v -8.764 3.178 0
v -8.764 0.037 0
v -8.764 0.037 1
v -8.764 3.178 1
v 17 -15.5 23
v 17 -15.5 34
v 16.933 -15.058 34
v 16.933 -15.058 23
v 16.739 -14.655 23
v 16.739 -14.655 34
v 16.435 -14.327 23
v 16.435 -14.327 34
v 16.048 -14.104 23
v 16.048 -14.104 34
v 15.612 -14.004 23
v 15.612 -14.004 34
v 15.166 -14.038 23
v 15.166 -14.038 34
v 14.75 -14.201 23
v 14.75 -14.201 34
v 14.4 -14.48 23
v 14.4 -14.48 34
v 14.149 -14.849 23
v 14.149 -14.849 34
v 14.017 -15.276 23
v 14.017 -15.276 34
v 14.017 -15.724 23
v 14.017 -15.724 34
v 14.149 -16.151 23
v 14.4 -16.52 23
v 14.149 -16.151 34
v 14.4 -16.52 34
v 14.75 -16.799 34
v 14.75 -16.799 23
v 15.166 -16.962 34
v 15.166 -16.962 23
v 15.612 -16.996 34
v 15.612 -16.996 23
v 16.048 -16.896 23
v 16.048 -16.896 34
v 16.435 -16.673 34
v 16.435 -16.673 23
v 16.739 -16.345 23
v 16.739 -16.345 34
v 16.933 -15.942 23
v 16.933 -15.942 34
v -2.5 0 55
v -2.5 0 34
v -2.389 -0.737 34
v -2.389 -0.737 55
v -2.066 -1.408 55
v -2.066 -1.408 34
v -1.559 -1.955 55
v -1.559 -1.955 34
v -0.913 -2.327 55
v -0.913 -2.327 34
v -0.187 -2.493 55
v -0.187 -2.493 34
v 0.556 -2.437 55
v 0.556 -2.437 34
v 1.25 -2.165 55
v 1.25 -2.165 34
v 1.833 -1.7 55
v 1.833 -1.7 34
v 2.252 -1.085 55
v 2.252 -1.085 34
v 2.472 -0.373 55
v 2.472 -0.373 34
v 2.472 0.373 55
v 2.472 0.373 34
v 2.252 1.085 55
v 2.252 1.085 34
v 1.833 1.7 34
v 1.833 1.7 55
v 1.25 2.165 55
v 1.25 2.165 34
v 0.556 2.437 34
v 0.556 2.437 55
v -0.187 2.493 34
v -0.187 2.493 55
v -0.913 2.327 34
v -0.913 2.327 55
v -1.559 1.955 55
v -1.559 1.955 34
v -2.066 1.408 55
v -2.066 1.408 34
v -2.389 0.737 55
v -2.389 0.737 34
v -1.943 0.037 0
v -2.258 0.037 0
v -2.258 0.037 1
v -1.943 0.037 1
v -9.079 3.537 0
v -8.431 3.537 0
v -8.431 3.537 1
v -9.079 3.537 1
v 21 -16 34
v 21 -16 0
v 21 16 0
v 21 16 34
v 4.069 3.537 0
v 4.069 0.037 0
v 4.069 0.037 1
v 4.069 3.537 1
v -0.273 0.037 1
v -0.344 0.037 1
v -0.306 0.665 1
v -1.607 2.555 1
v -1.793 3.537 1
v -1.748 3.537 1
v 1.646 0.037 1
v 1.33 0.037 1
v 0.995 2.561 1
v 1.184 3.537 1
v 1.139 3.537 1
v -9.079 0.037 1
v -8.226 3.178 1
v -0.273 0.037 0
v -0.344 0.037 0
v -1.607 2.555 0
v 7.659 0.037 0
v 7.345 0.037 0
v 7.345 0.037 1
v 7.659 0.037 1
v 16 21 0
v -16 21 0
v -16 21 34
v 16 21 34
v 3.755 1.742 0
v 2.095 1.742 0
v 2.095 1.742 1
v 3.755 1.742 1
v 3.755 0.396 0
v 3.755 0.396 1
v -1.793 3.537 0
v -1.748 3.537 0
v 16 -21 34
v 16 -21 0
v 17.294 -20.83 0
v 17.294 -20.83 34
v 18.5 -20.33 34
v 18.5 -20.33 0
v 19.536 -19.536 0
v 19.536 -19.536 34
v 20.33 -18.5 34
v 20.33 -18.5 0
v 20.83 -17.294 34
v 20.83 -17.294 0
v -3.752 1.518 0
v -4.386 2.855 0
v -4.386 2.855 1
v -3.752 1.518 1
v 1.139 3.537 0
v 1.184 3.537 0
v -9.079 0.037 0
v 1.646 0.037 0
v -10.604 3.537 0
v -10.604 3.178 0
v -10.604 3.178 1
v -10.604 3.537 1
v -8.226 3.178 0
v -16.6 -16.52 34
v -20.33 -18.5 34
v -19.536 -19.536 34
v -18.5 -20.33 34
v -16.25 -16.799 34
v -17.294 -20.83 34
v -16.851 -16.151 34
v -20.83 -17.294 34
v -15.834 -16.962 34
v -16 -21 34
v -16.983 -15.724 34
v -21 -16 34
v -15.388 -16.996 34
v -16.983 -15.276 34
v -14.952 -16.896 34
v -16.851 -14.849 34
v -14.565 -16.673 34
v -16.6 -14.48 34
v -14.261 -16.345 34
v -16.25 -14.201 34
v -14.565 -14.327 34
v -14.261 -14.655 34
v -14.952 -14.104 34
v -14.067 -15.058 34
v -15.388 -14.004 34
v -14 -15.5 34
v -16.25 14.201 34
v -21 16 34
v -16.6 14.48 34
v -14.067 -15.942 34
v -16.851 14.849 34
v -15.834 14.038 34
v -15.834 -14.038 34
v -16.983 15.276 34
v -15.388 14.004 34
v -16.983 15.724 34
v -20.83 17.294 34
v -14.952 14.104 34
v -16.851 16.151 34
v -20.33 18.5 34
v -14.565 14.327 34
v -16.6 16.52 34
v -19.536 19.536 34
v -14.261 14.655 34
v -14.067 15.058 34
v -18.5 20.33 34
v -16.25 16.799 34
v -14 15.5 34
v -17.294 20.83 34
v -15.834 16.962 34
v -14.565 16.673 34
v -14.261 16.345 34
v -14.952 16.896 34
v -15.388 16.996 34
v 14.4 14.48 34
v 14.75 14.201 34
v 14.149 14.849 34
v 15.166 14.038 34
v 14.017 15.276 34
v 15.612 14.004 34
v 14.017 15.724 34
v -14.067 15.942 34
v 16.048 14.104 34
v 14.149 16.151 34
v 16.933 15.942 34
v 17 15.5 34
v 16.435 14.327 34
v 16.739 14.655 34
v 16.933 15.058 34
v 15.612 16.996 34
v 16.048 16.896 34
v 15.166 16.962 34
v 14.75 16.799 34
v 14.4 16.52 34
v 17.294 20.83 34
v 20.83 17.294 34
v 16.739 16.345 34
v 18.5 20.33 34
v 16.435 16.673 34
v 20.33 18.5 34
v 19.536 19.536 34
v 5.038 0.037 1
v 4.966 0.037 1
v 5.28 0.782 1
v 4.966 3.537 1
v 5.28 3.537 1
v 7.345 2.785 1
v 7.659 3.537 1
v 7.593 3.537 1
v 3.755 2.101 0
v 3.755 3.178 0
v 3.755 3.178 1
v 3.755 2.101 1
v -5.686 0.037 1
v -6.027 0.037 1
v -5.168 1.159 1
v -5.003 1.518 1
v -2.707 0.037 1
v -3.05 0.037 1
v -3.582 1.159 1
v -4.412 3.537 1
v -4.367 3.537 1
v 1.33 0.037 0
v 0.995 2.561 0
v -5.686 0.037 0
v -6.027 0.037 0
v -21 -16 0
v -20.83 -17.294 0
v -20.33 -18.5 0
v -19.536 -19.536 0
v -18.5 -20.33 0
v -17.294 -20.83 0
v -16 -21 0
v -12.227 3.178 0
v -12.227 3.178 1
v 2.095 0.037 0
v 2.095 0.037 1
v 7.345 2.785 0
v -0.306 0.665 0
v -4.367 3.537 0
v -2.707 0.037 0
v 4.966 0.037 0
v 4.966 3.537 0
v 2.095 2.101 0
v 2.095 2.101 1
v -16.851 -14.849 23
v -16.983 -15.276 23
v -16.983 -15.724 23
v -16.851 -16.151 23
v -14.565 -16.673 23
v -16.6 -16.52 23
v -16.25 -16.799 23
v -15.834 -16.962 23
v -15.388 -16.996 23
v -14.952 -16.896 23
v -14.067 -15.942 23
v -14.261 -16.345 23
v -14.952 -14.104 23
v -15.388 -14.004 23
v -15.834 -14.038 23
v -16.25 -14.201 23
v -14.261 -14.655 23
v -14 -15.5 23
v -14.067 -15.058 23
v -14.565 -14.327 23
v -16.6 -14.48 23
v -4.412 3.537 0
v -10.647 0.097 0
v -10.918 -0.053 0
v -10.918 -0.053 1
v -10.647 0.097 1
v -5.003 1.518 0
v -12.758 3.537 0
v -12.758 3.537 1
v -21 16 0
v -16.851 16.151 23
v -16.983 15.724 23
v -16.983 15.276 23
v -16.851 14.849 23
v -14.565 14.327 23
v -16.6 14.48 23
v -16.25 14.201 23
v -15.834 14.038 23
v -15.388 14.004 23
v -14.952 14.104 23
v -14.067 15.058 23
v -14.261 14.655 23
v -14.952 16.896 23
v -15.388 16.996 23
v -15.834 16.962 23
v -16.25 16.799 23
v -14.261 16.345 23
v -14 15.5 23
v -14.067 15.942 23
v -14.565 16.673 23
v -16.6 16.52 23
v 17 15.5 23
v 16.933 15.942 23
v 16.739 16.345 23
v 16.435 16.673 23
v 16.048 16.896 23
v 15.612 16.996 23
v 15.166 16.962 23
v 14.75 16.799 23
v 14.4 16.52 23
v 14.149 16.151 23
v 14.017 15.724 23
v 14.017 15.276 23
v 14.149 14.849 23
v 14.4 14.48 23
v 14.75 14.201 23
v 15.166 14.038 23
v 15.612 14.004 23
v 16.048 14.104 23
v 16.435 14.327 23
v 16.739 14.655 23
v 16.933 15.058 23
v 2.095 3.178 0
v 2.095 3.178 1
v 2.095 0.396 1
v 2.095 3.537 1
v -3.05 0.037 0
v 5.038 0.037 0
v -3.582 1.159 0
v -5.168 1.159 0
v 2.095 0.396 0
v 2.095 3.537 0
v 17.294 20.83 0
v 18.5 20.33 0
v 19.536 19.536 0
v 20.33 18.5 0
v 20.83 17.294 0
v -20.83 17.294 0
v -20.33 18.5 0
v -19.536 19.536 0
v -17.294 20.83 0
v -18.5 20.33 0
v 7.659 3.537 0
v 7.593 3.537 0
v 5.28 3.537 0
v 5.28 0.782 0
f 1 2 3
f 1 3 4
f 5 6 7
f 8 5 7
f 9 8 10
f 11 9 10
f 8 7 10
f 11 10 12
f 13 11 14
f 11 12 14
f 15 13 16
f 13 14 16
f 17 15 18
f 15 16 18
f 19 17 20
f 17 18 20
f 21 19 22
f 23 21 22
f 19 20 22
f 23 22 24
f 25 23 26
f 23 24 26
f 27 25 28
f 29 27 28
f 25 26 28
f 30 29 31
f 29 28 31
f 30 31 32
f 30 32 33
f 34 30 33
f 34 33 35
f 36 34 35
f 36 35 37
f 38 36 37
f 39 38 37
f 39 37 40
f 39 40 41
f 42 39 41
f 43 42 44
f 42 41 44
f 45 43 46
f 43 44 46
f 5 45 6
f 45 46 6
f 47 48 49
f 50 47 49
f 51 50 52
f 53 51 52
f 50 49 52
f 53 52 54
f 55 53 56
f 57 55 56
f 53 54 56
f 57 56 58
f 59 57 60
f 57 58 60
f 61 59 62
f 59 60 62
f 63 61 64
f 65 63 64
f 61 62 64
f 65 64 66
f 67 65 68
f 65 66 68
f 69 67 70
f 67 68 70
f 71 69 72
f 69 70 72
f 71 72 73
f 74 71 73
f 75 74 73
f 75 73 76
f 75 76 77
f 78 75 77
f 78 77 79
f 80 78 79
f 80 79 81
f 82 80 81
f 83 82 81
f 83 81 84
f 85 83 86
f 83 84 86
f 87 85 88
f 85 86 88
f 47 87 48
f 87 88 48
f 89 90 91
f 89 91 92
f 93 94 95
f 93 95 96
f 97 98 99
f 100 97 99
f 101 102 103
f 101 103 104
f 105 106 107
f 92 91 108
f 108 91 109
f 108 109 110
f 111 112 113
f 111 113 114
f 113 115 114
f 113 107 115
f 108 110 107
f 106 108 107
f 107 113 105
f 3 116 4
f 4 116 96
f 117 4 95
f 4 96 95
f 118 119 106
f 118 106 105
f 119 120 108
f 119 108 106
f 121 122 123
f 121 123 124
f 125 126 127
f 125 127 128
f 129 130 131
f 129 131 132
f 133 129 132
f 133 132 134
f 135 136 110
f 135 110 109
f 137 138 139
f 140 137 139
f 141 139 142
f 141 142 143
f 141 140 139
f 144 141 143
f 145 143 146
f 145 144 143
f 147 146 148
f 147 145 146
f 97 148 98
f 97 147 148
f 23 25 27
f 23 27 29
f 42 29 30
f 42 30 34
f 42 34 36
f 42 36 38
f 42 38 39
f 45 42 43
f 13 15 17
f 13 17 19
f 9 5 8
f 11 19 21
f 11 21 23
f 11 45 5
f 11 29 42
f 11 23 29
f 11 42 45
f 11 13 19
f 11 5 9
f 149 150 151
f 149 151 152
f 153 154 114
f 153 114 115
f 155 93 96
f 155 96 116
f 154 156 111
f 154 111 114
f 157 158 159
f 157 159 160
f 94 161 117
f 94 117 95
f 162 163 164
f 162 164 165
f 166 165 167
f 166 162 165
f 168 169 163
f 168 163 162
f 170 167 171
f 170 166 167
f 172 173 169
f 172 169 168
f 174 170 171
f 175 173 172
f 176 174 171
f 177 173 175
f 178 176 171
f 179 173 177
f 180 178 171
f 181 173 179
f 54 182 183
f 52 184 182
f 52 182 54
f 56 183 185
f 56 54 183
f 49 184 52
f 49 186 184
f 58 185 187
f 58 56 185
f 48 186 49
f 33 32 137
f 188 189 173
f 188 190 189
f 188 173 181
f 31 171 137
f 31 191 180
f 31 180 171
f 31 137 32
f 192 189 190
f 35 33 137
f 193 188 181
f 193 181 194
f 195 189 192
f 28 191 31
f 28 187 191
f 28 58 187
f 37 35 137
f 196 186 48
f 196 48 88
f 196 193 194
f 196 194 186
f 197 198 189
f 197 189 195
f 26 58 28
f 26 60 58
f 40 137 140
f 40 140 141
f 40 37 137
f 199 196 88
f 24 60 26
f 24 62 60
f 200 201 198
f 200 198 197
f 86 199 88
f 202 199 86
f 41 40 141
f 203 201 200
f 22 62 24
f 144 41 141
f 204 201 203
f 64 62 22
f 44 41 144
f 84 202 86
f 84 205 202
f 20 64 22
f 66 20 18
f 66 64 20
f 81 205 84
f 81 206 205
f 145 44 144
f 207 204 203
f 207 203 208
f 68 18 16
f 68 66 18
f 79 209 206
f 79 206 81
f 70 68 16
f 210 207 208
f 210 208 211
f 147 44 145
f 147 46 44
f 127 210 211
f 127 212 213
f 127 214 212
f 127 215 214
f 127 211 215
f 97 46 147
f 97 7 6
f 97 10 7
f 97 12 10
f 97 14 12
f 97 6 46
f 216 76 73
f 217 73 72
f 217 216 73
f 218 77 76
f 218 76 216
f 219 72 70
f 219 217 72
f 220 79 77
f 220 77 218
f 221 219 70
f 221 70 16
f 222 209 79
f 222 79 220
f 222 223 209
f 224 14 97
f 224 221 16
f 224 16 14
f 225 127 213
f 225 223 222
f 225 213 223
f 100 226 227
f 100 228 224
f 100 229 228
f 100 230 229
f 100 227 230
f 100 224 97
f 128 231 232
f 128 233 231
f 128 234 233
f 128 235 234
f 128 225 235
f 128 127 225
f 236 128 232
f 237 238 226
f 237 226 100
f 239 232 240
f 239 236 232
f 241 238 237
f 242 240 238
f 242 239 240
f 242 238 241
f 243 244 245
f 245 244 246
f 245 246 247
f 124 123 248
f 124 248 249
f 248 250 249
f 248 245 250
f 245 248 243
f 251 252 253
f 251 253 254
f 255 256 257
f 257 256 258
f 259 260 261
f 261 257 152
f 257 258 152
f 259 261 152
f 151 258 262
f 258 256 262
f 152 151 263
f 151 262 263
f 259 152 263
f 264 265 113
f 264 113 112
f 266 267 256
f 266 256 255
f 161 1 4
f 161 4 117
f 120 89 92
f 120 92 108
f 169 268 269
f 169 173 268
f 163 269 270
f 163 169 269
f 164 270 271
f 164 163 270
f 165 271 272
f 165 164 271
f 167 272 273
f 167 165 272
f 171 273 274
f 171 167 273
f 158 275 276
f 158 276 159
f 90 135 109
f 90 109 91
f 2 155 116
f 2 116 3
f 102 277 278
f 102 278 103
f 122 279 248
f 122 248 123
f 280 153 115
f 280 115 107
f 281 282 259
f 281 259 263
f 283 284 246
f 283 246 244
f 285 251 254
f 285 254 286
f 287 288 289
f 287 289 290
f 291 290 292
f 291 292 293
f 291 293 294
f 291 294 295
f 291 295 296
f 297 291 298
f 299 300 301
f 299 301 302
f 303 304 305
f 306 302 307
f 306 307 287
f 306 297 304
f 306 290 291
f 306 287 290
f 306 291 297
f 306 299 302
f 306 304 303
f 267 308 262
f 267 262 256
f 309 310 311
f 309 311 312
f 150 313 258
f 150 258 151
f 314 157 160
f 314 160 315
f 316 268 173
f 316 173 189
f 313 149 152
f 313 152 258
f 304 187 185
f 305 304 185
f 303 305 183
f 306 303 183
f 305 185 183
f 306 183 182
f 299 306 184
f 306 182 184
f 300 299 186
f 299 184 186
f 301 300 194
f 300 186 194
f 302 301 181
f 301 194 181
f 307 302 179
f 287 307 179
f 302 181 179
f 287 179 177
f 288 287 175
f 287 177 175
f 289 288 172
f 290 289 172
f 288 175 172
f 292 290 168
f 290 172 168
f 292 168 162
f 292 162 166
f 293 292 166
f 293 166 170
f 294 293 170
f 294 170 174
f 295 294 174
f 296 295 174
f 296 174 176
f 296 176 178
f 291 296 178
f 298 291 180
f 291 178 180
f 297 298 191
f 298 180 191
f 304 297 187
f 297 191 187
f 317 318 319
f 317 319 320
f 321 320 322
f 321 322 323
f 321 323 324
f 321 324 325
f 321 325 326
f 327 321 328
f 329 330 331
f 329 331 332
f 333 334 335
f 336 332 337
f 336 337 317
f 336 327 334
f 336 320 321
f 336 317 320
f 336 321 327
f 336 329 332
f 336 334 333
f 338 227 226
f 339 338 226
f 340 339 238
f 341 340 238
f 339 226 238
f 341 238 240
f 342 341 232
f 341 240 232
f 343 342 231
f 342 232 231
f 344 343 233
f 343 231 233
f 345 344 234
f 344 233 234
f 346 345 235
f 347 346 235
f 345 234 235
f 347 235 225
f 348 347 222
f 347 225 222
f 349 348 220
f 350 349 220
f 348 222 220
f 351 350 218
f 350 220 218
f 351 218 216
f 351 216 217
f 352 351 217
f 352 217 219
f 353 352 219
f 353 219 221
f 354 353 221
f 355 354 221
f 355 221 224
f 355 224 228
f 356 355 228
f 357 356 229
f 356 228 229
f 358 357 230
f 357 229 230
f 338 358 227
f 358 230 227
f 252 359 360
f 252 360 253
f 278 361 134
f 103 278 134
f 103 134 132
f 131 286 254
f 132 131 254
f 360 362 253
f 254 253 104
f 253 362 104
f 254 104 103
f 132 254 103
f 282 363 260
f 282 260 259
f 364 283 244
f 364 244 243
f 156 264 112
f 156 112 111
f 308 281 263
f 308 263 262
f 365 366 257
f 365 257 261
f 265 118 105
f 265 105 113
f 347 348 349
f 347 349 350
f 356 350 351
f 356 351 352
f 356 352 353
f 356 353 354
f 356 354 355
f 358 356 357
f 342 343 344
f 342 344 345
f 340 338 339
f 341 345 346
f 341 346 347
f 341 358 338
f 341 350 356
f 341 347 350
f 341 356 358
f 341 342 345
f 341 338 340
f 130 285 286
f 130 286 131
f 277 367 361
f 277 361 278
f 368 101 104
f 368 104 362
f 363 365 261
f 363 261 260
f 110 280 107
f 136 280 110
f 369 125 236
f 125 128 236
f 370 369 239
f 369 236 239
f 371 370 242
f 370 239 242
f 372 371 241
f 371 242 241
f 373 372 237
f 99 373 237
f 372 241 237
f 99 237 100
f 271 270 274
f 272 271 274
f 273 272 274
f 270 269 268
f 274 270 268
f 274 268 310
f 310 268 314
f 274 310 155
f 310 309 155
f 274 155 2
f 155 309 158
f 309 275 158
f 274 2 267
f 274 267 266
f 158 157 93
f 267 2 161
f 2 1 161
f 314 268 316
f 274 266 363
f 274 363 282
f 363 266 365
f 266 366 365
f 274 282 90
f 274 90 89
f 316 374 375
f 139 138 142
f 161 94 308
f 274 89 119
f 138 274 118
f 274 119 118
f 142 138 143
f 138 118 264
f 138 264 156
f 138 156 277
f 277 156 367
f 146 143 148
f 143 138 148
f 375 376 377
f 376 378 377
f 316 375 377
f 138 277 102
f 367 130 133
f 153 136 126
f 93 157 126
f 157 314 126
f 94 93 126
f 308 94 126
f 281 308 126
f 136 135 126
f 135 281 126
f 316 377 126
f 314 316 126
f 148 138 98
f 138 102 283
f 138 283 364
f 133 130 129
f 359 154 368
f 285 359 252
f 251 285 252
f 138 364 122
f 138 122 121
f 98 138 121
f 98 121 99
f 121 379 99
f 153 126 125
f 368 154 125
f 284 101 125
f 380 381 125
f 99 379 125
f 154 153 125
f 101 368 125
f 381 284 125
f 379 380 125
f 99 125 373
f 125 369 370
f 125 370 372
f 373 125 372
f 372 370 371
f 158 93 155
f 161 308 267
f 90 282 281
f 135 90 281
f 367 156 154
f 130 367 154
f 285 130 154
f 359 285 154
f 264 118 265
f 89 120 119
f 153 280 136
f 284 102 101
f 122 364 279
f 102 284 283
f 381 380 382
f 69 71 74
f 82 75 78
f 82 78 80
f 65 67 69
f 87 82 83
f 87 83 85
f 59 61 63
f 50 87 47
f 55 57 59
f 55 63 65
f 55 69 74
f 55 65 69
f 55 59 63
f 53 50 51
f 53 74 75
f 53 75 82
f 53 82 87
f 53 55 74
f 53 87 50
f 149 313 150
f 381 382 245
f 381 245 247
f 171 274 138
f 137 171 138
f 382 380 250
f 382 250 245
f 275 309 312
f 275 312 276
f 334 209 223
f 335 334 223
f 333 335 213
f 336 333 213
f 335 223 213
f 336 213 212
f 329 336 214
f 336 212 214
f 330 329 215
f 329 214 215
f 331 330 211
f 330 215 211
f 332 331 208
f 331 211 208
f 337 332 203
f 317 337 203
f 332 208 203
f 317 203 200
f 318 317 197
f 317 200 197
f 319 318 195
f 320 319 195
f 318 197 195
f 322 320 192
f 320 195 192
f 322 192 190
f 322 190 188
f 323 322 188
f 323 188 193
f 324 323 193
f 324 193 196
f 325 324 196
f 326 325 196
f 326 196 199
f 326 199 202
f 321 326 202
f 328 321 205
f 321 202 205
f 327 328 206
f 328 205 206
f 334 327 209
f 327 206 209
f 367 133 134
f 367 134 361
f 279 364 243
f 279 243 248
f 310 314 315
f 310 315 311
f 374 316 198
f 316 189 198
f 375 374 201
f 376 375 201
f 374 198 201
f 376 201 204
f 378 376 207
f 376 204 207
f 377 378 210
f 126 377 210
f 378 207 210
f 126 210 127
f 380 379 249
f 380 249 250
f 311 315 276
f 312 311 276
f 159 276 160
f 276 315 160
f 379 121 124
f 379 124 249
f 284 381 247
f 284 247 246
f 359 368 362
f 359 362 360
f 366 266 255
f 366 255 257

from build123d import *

# Parameters (mm, degrees)
SZKIC1_W                    = 42
SZKIC1_H                    = 42
DODANIE_WYCI_GNI_CIE1_DEPTH = 34
SZKIC2_R                    = 1.5
WYTNIJ_WYCI_GNI_CIE1_DEPTH  = 11
SZKIC6_R                    = 1.5
WYTNIJ_WYCI_GNI_CIE2_DEPTH  = 11
SZKIC7_R                    = 1.5
WYTNIJ_WYCI_GNI_CIE3_DEPTH  = 11
SZKIC8_R                    = 1.5
WYTNIJ_WYCI_GNI_CIE4_DEPTH  = 11
ZAOKR_GLENIE1_R             = 5
SZKIC9_R                    = 2.5
DODANIE_WYCI_GNI_CIE4_DEPTH = 21
WYTNIJ_WYCI_GNI_CIE5_DEPTH  = 1


with BuildPart() as part:
    # Szkic1 → Dodanie-wyciągnięcie1 (new body)
    with BuildSketch(Plane.XY):
        Rectangle(SZKIC1_W, SZKIC1_H)
    extrude(amount=DODANIE_WYCI_GNI_CIE1_DEPTH)

    # Szkic2 → Wytnij-wyciągnięcie1 (cut)
    with BuildSketch(Plane.XY.offset(34)):
        with Locations((15.5, 15.5)):
            Circle(SZKIC2_R)
    extrude(amount=-WYTNIJ_WYCI_GNI_CIE1_DEPTH, mode=Mode.SUBTRACT)

    # Szkic6 → Wytnij-wyciągnięcie2 (cut)
    with BuildSketch(Plane.XY.offset(34)):
        with Locations((-15.5, 15.5)):
            Circle(SZKIC6_R)
    extrude(amount=-WYTNIJ_WYCI_GNI_CIE2_DEPTH, mode=Mode.SUBTRACT)

    # Szkic7 → Wytnij-wyciągnięcie3 (cut)
    with BuildSketch(Plane.XY.offset(34)):
        with Locations((-15.5, -15.5)):
            Circle(SZKIC7_R)
    extrude(amount=-WYTNIJ_WYCI_GNI_CIE3_DEPTH, mode=Mode.SUBTRACT)

    # Szkic8 → Wytnij-wyciągnięcie4 (cut)
    with BuildSketch(Plane.XY.offset(34)):
        with Locations((15.5, -15.5)):
            Circle(SZKIC8_R)
    extrude(amount=-WYTNIJ_WYCI_GNI_CIE4_DEPTH, mode=Mode.SUBTRACT)

    # Zaokrąglenie1
    zaokr_glenie1_edges = [part.edges().sort_by_distance(p)[0] for p in [
        (21, -21, 17),
        (-21, -21, 17),
        (-21, 21, 17),
        (21, 21, 17),
    ]]
    fillet(zaokr_glenie1_edges, radius=ZAOKR_GLENIE1_R)

    # Szkic9 → Dodanie-wyciągnięcie4 (add)
    with BuildSketch(Plane.XY.offset(34)):
        with Locations(Location((0, 0, 0), (0, 0, 180))):
            Circle(SZKIC9_R)
    extrude(amount=DODANIE_WYCI_GNI_CIE4_DEPTH)

    # Szkic11 → Wytnij-wyciągnięcie5 (cut)
    # profile 1 of 6: a face of its own
    with BuildSketch(Plane(origin=(0, 0, 0), x_dir=(-1, 0, 0), z_dir=(0, 0, -1))):
        Polygon((-7.658605606, 0.036910524), (-7.658605606, 3.536910524), (-7.592700157, 3.536910524), (-5.280400478, 0.782202992), (-5.280400478, 3.536910524), (-4.966297913, 3.536910524), (-4.966297913, 0.036910524), (-5.037812336, 0.036910524), (-7.344503042, 2.78530796), (-7.344503042, 0.036910524), align=None)
    # profile 2 of 6: a face of its own
    with BuildSketch(Plane(origin=(0, 0, 0), x_dir=(-1, 0, 0), z_dir=(0, 0, -1))):
        Polygon((-4.068862016, 3.536910524), (-2.094503042, 3.536910524), (-2.094503042, 3.177936165), (-3.754759452, 3.177936165), (-3.754759452, 2.101013088), (-2.094503042, 2.101013088), (-2.094503042, 1.742038729), (-3.754759452, 1.742038729), (-3.754759452, 0.395884883), (-2.094503042, 0.395884883), (-2.094503042, 0.036910524), (-4.068862016, 0.036910524), align=None)
    # profile 3 of 6: a face of its own
    with BuildSketch(Plane(origin=(0, 0, 0), x_dir=(-1, 0, 0), z_dir=(0, 0, -1))):
        Polygon((-1.645785093, 0.036910524), (-1.18374583, 3.536910524), (-1.138874035, 3.536910524), (0.306137984, 0.665115652), (1.747644394, 3.536910524), (1.793217311, 3.536910524), (2.258061061, 0.036910524), (1.942556253, 0.036910524), (1.607420035, 2.555340011), (0.343998561, 0.036910524), (0.27318526, 0.036910524), (-0.995144067, 2.560948986), (-1.329579163, 0.036910524), align=None)
    # profile 4 of 6: a face of its own
    with BuildSketch(Plane(origin=(0, 0, 0), x_dir=(-1, 0, 0), z_dir=(0, 0, -1))):
        Polygon((4.411907215, 3.536910524), (6.02729183, 0.036910524), (5.685845516, 0.036910524), (5.168417631, 1.158705396), (3.58177901, 1.158705396), (3.049627567, 0.036910524), (2.70677901, 0.036910524), (4.36703542, 3.536910524), align=None)
        Polygon((4.385965708, 2.854719018), (3.752151606, 1.517679755), (5.002952888, 1.517679755), align=None, mode=Mode.SUBTRACT)
    # profile 5 of 6: a face of its own
    with BuildSketch(Plane(origin=(0, 0, 0), x_dir=(-1, 0, 0), z_dir=(0, 0, -1))):
        Polygon((8.431438465, 3.536910524), (9.078573881, 3.536910524), (9.078573881, 0.036910524), (8.764471317, 0.036910524), (8.764471317, 3.177936165), (8.226009779, 3.177936165), align=None)
    # profile 6 of 6: a face of its own
    with BuildSketch(Plane(origin=(0, 0, 0), x_dir=(-1, 0, 0), z_dir=(0, 0, -1))):
        Polygon((10.604214907, 3.536910524), (12.758061061, 3.536910524), (10.918317471, -0.052833066), (10.646983337, 0.096505877), (12.22661074, 3.177936165), (10.604214907, 3.177936165), align=None)
    extrude(amount=-WYTNIJ_WYCI_GNI_CIE5_DEPTH, mode=Mode.SUBTRACT)


solid = part.part
